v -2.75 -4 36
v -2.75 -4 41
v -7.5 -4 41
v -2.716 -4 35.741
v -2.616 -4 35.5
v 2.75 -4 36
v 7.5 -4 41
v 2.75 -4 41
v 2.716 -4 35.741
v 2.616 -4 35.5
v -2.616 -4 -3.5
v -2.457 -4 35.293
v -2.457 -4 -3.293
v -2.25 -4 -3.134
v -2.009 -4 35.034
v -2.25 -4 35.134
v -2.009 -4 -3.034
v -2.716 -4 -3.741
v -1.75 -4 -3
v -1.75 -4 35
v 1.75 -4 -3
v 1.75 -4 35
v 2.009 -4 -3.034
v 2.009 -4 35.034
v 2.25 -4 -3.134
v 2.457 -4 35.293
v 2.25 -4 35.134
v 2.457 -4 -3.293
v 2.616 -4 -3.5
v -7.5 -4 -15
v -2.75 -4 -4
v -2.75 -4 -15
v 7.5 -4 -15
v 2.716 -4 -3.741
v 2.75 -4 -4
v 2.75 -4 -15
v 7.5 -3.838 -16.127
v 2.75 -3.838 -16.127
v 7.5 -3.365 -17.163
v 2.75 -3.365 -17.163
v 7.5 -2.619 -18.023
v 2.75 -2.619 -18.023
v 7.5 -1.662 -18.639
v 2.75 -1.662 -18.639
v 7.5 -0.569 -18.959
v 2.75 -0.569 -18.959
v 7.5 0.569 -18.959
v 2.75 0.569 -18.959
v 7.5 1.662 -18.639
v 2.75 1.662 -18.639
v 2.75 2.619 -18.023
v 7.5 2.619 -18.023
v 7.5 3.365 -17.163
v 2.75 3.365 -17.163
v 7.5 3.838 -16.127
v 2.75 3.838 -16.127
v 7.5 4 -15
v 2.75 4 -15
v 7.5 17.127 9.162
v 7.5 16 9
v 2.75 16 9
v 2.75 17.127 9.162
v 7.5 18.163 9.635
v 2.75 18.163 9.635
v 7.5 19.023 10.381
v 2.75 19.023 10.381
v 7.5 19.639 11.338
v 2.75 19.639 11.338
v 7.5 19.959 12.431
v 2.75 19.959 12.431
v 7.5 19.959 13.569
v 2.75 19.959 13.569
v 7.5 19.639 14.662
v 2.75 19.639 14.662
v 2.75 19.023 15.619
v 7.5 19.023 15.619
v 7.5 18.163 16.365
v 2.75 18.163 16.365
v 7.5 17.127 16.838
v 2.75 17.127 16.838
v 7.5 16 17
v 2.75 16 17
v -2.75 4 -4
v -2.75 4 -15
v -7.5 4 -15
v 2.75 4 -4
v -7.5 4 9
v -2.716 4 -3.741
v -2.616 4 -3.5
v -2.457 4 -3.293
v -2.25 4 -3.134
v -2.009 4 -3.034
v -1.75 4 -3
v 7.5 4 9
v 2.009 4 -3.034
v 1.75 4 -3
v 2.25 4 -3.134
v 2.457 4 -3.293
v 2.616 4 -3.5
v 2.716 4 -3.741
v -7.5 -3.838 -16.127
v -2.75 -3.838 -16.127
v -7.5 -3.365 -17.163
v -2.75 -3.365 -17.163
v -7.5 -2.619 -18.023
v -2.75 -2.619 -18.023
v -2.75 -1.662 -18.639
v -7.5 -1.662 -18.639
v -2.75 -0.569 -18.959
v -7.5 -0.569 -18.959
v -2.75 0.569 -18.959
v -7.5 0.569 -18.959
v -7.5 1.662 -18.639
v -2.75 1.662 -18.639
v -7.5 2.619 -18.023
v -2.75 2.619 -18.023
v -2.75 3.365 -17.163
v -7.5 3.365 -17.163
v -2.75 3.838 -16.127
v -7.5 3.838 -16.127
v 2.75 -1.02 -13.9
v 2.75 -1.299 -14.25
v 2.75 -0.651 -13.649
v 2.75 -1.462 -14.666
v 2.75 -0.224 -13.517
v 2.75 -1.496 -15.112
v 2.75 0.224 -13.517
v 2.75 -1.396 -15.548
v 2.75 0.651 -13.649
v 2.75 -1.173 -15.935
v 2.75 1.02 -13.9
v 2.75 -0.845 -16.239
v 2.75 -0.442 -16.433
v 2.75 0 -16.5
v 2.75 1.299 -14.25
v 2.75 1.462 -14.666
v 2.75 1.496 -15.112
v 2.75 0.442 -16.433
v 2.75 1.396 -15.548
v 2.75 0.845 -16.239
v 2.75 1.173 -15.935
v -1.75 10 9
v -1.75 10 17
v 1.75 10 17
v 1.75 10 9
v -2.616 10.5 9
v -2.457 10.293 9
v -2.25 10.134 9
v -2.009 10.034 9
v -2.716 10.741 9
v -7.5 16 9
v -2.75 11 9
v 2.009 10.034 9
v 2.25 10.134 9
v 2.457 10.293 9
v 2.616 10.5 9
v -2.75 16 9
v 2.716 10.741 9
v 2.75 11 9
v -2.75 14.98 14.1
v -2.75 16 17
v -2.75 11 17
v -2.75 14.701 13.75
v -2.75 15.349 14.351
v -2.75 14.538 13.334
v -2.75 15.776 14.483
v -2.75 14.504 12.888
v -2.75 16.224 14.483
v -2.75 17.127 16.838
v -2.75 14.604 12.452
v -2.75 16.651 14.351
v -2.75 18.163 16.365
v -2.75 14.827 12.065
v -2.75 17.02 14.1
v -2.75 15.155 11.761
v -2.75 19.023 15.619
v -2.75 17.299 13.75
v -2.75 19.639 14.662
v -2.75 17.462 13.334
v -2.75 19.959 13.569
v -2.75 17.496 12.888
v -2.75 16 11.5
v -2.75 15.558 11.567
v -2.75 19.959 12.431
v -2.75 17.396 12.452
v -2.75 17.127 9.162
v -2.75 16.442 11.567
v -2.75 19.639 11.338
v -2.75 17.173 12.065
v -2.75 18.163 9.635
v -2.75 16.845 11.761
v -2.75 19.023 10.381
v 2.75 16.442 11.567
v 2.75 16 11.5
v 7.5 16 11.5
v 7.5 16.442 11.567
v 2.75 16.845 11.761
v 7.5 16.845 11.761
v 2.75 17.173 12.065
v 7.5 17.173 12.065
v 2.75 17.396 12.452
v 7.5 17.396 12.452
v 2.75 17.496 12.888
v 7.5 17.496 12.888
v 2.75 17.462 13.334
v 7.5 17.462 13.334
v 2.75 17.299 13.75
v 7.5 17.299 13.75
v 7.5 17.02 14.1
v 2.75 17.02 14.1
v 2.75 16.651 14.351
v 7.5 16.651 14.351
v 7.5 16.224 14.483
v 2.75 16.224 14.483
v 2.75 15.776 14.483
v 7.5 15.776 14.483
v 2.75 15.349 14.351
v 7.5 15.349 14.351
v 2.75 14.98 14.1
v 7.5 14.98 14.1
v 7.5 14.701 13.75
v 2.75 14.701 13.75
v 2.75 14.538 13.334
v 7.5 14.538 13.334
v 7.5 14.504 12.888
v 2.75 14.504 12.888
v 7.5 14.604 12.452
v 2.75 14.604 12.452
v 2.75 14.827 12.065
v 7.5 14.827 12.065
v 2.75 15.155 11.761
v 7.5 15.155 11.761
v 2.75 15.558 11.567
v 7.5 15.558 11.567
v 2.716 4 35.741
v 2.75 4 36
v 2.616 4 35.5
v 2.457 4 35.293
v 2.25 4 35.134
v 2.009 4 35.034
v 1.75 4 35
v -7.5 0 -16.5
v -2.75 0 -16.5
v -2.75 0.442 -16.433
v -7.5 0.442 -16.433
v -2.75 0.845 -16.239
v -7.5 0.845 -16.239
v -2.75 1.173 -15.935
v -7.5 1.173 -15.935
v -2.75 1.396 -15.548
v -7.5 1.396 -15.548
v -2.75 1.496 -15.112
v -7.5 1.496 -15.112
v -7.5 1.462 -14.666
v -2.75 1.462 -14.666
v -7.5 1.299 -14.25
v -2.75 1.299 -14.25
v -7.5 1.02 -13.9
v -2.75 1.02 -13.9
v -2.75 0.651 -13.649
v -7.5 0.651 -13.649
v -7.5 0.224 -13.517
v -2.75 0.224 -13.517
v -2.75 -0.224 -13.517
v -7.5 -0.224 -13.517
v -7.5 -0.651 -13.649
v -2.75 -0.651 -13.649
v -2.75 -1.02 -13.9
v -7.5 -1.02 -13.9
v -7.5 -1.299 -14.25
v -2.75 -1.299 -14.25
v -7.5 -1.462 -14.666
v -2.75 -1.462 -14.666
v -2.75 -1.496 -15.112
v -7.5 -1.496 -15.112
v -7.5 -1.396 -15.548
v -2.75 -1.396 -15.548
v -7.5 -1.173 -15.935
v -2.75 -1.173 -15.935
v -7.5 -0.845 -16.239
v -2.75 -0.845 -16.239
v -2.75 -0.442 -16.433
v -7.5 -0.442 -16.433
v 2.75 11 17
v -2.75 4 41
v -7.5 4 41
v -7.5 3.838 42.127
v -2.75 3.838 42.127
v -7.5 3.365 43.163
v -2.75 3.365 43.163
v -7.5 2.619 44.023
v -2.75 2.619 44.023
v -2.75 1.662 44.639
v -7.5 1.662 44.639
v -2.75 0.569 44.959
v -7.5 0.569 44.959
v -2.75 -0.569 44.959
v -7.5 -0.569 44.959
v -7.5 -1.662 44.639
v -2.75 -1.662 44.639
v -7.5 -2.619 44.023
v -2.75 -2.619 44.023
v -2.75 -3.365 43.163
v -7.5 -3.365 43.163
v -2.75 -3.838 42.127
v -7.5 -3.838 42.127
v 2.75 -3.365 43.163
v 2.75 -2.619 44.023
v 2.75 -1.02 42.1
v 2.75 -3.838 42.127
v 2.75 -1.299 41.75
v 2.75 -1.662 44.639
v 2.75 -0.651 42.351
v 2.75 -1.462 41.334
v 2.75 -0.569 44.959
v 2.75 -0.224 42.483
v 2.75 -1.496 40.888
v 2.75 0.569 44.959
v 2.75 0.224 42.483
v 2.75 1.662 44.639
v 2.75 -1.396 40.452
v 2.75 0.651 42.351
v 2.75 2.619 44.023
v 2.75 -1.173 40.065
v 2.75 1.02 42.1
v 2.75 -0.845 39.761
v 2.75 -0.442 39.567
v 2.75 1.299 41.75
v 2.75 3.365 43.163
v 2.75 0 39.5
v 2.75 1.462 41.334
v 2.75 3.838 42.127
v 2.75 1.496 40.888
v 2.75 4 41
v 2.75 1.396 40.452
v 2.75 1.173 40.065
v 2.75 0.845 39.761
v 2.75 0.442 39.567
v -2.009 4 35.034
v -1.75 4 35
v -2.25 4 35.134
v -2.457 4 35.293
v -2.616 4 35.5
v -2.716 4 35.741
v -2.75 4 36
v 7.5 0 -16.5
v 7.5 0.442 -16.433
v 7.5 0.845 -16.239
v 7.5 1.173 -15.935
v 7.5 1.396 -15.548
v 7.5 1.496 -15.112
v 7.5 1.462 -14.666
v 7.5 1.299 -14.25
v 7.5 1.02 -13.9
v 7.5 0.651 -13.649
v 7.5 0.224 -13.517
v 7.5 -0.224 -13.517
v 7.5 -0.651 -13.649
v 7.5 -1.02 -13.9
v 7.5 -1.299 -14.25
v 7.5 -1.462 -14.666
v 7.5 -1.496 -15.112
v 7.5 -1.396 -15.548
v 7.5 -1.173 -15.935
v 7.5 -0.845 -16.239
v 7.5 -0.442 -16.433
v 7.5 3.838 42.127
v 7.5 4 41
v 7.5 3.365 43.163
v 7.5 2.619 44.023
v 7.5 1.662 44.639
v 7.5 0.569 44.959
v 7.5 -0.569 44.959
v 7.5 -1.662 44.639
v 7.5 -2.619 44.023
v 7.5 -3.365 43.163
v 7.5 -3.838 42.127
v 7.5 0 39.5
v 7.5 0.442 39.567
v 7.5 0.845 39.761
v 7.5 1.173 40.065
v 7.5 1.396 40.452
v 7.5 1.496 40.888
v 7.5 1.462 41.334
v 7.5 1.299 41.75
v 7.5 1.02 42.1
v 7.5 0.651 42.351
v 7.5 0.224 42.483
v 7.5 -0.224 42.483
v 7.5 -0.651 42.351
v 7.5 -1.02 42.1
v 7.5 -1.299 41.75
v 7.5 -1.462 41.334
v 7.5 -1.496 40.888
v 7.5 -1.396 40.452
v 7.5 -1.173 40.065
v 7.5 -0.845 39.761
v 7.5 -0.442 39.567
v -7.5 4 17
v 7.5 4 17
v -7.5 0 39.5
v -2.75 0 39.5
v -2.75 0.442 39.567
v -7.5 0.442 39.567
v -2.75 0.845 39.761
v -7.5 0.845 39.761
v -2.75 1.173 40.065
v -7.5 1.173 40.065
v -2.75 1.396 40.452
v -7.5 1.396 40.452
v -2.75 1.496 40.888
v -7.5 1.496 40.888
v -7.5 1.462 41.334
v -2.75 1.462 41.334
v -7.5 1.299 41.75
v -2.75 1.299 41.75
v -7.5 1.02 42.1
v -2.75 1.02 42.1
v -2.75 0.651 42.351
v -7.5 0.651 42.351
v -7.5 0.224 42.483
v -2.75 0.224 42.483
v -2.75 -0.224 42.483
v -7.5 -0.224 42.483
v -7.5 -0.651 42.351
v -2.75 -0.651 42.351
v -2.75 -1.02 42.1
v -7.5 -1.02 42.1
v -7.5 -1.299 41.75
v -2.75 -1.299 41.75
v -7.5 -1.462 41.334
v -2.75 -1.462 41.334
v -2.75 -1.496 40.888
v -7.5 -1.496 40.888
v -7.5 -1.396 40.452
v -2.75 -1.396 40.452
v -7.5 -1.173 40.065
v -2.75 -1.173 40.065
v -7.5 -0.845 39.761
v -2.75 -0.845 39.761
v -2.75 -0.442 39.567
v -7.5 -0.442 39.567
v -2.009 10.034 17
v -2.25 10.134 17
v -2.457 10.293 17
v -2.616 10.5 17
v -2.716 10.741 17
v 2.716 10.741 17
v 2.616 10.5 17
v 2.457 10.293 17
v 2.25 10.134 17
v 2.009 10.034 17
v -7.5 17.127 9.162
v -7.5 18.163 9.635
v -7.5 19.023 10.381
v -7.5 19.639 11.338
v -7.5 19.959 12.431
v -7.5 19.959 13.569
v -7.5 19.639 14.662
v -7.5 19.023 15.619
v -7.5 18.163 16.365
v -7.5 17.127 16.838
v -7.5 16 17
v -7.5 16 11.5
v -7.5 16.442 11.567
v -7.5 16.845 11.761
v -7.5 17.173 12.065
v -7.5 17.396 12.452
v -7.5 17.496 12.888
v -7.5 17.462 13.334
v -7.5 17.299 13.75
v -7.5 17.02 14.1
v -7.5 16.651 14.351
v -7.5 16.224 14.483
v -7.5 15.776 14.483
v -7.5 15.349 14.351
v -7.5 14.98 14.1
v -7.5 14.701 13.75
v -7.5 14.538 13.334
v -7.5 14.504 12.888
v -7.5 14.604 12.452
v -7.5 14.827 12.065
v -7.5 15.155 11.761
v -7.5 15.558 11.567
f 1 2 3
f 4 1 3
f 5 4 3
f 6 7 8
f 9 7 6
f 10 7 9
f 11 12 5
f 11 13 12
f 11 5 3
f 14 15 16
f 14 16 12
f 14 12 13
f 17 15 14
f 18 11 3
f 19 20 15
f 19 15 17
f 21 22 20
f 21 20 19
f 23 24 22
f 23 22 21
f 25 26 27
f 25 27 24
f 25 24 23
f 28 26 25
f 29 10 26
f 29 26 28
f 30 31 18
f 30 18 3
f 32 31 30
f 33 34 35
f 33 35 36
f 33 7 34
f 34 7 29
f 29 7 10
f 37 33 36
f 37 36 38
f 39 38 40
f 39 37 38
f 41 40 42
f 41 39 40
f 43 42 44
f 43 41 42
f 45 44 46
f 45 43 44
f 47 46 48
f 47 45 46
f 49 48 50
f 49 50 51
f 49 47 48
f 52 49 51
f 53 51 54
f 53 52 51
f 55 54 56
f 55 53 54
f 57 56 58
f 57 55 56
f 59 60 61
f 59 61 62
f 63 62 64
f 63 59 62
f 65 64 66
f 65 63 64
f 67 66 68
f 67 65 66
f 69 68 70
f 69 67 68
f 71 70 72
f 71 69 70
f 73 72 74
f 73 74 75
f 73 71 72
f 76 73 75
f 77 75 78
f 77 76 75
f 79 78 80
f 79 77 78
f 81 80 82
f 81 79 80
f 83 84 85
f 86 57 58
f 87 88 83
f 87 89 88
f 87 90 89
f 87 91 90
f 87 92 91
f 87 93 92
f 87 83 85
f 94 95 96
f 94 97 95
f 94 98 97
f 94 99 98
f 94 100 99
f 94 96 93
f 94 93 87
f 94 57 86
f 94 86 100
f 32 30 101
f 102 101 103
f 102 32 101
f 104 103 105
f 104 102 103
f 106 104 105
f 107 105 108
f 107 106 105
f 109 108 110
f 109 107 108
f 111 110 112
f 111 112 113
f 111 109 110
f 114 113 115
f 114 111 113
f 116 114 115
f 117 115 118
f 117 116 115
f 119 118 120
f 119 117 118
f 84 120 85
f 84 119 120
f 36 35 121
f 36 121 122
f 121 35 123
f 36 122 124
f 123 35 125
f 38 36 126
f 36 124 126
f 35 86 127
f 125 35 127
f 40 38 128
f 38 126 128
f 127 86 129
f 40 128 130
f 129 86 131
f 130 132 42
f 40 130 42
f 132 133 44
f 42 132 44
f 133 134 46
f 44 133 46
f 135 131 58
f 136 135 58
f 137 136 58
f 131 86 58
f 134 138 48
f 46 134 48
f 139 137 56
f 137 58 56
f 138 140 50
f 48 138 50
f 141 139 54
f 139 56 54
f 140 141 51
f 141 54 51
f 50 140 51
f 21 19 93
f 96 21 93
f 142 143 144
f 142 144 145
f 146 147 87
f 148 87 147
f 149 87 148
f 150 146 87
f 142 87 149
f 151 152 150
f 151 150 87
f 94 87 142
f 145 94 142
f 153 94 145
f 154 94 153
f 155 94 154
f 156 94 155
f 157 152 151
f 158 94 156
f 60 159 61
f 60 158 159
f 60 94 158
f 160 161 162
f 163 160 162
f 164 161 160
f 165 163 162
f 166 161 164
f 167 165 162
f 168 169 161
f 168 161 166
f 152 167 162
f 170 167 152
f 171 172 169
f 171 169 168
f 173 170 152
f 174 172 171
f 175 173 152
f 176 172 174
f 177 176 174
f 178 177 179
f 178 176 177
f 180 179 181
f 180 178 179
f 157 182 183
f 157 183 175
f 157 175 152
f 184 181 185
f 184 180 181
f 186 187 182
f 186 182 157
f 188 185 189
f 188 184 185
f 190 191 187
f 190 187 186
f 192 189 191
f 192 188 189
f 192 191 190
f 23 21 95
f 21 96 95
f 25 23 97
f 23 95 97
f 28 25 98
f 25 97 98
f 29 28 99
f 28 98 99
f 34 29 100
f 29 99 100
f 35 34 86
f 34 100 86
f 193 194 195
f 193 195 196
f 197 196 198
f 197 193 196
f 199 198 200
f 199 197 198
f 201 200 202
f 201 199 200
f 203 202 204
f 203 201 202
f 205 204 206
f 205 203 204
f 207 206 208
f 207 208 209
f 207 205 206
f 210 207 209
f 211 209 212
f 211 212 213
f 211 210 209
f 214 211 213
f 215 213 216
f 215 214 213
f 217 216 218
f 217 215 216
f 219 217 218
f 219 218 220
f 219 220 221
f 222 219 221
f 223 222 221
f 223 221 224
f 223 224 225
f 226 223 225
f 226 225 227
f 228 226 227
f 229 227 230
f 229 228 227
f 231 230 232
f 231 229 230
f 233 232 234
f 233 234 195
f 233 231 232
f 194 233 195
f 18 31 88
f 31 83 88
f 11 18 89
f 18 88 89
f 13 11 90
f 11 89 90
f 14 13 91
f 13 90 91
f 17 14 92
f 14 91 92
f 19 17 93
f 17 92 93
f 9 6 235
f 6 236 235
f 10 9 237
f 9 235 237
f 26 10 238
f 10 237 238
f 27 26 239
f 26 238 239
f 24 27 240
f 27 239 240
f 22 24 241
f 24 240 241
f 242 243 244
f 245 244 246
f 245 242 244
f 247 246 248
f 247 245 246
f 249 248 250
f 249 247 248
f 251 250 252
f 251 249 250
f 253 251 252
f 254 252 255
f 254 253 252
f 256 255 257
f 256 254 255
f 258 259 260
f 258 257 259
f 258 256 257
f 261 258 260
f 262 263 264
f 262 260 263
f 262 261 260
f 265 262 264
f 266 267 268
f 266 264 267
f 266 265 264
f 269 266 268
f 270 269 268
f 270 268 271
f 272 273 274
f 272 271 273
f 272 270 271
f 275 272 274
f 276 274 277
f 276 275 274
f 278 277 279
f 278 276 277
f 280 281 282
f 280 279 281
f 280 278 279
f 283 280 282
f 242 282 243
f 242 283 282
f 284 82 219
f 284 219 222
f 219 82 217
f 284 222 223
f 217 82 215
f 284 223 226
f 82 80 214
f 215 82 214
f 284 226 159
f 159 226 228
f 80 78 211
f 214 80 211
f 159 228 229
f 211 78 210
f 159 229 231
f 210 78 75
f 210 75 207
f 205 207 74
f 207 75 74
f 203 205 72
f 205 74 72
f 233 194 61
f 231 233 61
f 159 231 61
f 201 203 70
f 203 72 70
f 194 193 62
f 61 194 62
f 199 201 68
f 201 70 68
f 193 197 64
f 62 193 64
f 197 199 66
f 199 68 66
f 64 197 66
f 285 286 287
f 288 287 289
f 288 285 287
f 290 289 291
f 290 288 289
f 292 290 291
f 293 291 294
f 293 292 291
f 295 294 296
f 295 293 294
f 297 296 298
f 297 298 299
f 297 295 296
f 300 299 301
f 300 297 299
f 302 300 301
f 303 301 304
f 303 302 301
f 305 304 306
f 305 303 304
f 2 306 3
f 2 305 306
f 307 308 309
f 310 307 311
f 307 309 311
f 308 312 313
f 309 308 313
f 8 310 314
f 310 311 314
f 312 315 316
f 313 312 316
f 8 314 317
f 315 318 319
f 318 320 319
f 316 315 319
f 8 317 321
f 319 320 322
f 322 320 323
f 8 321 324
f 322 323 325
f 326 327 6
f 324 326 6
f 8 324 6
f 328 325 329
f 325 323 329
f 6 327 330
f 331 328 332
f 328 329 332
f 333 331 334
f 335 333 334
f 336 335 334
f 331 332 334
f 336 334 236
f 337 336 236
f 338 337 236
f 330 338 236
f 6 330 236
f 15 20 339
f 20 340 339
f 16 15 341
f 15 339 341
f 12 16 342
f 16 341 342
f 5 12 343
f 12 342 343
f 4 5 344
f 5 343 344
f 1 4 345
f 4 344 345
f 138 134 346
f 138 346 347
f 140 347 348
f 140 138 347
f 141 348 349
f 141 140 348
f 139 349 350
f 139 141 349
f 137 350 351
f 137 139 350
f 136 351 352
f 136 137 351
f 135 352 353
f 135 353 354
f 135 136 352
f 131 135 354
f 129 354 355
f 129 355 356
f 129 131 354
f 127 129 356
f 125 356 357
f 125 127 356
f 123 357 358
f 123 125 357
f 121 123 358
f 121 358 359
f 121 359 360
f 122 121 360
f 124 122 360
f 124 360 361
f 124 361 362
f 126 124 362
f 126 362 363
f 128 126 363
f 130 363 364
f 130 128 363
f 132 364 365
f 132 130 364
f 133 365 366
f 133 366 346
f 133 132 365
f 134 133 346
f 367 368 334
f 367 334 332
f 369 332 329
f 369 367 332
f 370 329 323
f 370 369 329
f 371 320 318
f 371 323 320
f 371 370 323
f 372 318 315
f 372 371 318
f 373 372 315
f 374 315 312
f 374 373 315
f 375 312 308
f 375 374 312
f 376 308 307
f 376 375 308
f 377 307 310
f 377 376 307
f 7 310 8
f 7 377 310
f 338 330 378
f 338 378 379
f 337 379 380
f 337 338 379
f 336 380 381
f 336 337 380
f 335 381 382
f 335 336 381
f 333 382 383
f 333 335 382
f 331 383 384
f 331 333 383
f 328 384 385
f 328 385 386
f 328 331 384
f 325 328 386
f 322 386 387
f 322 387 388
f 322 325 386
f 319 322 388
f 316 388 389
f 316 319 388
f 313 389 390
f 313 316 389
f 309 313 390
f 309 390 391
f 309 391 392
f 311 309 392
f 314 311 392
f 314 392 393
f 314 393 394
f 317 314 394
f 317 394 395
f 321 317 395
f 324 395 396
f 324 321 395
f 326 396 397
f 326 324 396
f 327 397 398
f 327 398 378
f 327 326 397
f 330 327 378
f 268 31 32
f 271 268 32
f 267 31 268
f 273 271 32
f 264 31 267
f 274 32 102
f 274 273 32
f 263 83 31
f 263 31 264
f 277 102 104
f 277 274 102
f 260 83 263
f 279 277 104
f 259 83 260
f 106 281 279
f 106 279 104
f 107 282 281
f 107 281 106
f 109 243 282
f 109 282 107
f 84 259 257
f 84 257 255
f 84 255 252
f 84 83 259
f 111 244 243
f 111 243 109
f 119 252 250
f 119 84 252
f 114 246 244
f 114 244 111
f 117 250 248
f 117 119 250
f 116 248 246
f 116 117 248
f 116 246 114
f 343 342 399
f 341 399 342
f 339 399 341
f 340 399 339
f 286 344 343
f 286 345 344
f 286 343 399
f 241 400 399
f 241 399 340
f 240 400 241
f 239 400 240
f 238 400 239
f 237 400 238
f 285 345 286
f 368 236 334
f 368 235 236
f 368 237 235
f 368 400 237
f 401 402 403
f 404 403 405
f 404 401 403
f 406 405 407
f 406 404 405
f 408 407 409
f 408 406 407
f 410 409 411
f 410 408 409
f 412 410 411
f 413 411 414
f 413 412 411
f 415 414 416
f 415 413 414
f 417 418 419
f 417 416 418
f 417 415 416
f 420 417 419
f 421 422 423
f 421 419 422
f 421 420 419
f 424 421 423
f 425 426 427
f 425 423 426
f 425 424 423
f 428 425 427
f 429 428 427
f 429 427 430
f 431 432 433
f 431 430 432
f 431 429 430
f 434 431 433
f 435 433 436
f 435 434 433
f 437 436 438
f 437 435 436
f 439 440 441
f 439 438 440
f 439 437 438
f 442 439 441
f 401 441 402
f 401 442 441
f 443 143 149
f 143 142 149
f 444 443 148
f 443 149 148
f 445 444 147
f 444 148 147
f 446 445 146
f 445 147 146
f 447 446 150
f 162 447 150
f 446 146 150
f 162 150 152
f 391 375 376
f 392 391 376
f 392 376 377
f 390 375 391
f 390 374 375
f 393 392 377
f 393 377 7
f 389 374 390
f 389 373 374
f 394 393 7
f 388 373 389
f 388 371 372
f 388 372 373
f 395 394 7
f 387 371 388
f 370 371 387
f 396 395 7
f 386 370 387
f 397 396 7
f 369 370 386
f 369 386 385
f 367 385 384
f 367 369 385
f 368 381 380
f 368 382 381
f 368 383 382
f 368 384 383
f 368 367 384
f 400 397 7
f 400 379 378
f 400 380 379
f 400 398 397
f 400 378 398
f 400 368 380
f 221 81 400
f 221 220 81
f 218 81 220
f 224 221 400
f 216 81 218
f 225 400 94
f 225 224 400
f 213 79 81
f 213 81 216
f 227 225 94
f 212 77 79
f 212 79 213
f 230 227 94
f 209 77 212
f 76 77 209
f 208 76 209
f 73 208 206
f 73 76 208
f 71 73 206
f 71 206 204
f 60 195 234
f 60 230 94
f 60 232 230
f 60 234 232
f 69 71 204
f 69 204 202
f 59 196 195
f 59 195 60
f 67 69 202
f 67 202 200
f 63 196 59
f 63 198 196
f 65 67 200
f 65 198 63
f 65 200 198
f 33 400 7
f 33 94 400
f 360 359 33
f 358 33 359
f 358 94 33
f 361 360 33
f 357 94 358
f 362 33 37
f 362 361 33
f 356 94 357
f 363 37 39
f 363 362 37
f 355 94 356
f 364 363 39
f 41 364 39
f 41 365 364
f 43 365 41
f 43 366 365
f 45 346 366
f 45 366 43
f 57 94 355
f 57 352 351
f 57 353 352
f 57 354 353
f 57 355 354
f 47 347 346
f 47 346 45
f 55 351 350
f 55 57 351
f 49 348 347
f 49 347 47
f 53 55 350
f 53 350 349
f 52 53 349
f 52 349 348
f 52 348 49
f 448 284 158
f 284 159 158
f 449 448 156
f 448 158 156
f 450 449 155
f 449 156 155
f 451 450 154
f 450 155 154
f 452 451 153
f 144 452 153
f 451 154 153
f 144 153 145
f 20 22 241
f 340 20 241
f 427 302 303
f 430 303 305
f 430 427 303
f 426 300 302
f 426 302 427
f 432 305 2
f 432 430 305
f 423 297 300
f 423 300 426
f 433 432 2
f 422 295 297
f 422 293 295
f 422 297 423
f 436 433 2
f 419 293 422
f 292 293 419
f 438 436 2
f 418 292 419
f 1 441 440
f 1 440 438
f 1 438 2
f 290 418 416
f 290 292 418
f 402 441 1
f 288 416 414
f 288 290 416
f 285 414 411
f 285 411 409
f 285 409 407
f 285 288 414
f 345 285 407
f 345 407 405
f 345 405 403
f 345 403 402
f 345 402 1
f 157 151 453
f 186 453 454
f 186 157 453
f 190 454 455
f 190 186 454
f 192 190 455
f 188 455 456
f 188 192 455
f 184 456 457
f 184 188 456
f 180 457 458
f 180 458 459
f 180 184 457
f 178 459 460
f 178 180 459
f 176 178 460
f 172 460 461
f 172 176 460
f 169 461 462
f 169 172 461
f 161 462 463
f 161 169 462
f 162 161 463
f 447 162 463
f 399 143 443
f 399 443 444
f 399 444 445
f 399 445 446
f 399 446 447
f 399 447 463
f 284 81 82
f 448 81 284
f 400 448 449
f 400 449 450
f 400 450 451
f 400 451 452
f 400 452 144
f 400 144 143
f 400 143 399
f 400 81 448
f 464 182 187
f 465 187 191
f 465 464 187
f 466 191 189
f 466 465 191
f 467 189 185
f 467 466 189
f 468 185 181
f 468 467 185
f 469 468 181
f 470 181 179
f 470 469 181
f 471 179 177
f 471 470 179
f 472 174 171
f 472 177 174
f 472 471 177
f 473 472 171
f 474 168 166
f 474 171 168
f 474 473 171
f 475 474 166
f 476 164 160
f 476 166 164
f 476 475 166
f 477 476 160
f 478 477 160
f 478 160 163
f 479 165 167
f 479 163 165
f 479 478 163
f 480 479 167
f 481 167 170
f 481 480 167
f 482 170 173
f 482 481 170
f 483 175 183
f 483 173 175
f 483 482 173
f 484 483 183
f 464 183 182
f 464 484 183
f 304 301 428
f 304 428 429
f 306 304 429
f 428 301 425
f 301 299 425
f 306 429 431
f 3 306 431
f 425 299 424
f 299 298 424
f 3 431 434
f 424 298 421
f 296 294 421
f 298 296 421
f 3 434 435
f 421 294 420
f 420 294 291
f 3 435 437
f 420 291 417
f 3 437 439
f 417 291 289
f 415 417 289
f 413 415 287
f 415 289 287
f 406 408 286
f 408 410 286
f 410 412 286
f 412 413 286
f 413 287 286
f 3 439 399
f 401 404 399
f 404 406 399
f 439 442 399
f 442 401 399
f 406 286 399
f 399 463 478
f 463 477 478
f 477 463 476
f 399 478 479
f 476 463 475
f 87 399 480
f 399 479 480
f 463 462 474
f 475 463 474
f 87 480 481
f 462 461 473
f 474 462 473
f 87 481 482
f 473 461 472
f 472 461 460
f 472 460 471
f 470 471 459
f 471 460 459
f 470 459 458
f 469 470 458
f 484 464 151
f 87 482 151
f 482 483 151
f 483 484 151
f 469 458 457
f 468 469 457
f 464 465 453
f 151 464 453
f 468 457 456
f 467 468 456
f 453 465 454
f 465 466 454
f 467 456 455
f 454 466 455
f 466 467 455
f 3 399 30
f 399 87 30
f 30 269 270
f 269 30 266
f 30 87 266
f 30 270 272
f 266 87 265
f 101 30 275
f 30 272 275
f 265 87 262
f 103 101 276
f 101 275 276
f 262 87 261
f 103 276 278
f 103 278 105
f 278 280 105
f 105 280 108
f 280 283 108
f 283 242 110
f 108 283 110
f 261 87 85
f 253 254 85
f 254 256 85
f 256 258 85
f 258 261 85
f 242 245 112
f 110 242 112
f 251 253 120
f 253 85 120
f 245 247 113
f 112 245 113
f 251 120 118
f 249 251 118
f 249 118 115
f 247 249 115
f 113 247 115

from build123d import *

# Parameters (mm, degrees)
CROQUIS1_R              = 1.5
SALIENTE_EXTRUIR1_DEPTH = 7.5
CROQUIS2_W              = 8
CROQUIS2_H              = 10
CROQUIS2_W_2            = 16
CROQUIS2_H_2            = 8
CROQUIS2_W_3            = 10
CORTAR_EXTRUIR1_DEPTH   = 2.75
REDONDEO1_R             = 1


with BuildPart() as part:
    # Croquis1 → Saliente-Extruir1 (new, symmetric)
    with BuildSketch(Plane(origin=(0, 0, 0), x_dir=(0, 0, -1), z_dir=(1, 0, 0))):
        with BuildLine():
            Line((-15, -4), (15, -4))
            ThreePointArc((15, -4), (19, 0), (15, 4))
            Line((15, 4), (-9, 4))
            Line((-9, 4), (-9, 16))
            ThreePointArc((-9, 16), (-13, 20), (-17, 16))
            Line((-17, 16), (-17, 4))
            Line((-17, 4), (-41, 4))
            ThreePointArc((-41, 4), (-45, 0), (-41, -4))
            Line((-41, -4), (-15, -4))
        make_face()
        with Locations((15, 0)):
            Circle(CROQUIS1_R, mode=Mode.SUBTRACT)
        with Locations((-13, 16)):
            Circle(CROQUIS1_R, mode=Mode.SUBTRACT)
        with Locations((-41, 0)):
            Circle(CROQUIS1_R, mode=Mode.SUBTRACT)
    extrude(amount=SALIENTE_EXTRUIR1_DEPTH, both=True)

    # Croquis2 → Cortar-Extruir1 (cut, symmetric)
    with BuildSketch(Plane(origin=(0, 0, 0), x_dir=(0, 0, -1), z_dir=(1, 0, 0))):
        with Locations((-13, 15)):
            Rectangle(CROQUIS2_W, CROQUIS2_H)
        with Locations((11, 0)):
            Rectangle(CROQUIS2_W_2, CROQUIS2_H_2)
        with Locations((-40, 0)):
            Rectangle(CROQUIS2_W_3, CROQUIS2_H_2)
    extrude(amount=CORTAR_EXTRUIR1_DEPTH, both=True, mode=Mode.SUBTRACT)

    # Redondeo1
    redondeo1_edges = [part.edges().sort_by_distance(p)[0] for p in [
        (2.75, 10, 13),
        (-2.75, 10, 13),
        (2.75, 0, 35),
        (-2.75, 0, 35),
        (2.75, 0, -3),
        (-2.75, 0, -3),
    ]]
    fillet(redondeo1_edges, radius=REDONDEO1_R)


solid = part.part
